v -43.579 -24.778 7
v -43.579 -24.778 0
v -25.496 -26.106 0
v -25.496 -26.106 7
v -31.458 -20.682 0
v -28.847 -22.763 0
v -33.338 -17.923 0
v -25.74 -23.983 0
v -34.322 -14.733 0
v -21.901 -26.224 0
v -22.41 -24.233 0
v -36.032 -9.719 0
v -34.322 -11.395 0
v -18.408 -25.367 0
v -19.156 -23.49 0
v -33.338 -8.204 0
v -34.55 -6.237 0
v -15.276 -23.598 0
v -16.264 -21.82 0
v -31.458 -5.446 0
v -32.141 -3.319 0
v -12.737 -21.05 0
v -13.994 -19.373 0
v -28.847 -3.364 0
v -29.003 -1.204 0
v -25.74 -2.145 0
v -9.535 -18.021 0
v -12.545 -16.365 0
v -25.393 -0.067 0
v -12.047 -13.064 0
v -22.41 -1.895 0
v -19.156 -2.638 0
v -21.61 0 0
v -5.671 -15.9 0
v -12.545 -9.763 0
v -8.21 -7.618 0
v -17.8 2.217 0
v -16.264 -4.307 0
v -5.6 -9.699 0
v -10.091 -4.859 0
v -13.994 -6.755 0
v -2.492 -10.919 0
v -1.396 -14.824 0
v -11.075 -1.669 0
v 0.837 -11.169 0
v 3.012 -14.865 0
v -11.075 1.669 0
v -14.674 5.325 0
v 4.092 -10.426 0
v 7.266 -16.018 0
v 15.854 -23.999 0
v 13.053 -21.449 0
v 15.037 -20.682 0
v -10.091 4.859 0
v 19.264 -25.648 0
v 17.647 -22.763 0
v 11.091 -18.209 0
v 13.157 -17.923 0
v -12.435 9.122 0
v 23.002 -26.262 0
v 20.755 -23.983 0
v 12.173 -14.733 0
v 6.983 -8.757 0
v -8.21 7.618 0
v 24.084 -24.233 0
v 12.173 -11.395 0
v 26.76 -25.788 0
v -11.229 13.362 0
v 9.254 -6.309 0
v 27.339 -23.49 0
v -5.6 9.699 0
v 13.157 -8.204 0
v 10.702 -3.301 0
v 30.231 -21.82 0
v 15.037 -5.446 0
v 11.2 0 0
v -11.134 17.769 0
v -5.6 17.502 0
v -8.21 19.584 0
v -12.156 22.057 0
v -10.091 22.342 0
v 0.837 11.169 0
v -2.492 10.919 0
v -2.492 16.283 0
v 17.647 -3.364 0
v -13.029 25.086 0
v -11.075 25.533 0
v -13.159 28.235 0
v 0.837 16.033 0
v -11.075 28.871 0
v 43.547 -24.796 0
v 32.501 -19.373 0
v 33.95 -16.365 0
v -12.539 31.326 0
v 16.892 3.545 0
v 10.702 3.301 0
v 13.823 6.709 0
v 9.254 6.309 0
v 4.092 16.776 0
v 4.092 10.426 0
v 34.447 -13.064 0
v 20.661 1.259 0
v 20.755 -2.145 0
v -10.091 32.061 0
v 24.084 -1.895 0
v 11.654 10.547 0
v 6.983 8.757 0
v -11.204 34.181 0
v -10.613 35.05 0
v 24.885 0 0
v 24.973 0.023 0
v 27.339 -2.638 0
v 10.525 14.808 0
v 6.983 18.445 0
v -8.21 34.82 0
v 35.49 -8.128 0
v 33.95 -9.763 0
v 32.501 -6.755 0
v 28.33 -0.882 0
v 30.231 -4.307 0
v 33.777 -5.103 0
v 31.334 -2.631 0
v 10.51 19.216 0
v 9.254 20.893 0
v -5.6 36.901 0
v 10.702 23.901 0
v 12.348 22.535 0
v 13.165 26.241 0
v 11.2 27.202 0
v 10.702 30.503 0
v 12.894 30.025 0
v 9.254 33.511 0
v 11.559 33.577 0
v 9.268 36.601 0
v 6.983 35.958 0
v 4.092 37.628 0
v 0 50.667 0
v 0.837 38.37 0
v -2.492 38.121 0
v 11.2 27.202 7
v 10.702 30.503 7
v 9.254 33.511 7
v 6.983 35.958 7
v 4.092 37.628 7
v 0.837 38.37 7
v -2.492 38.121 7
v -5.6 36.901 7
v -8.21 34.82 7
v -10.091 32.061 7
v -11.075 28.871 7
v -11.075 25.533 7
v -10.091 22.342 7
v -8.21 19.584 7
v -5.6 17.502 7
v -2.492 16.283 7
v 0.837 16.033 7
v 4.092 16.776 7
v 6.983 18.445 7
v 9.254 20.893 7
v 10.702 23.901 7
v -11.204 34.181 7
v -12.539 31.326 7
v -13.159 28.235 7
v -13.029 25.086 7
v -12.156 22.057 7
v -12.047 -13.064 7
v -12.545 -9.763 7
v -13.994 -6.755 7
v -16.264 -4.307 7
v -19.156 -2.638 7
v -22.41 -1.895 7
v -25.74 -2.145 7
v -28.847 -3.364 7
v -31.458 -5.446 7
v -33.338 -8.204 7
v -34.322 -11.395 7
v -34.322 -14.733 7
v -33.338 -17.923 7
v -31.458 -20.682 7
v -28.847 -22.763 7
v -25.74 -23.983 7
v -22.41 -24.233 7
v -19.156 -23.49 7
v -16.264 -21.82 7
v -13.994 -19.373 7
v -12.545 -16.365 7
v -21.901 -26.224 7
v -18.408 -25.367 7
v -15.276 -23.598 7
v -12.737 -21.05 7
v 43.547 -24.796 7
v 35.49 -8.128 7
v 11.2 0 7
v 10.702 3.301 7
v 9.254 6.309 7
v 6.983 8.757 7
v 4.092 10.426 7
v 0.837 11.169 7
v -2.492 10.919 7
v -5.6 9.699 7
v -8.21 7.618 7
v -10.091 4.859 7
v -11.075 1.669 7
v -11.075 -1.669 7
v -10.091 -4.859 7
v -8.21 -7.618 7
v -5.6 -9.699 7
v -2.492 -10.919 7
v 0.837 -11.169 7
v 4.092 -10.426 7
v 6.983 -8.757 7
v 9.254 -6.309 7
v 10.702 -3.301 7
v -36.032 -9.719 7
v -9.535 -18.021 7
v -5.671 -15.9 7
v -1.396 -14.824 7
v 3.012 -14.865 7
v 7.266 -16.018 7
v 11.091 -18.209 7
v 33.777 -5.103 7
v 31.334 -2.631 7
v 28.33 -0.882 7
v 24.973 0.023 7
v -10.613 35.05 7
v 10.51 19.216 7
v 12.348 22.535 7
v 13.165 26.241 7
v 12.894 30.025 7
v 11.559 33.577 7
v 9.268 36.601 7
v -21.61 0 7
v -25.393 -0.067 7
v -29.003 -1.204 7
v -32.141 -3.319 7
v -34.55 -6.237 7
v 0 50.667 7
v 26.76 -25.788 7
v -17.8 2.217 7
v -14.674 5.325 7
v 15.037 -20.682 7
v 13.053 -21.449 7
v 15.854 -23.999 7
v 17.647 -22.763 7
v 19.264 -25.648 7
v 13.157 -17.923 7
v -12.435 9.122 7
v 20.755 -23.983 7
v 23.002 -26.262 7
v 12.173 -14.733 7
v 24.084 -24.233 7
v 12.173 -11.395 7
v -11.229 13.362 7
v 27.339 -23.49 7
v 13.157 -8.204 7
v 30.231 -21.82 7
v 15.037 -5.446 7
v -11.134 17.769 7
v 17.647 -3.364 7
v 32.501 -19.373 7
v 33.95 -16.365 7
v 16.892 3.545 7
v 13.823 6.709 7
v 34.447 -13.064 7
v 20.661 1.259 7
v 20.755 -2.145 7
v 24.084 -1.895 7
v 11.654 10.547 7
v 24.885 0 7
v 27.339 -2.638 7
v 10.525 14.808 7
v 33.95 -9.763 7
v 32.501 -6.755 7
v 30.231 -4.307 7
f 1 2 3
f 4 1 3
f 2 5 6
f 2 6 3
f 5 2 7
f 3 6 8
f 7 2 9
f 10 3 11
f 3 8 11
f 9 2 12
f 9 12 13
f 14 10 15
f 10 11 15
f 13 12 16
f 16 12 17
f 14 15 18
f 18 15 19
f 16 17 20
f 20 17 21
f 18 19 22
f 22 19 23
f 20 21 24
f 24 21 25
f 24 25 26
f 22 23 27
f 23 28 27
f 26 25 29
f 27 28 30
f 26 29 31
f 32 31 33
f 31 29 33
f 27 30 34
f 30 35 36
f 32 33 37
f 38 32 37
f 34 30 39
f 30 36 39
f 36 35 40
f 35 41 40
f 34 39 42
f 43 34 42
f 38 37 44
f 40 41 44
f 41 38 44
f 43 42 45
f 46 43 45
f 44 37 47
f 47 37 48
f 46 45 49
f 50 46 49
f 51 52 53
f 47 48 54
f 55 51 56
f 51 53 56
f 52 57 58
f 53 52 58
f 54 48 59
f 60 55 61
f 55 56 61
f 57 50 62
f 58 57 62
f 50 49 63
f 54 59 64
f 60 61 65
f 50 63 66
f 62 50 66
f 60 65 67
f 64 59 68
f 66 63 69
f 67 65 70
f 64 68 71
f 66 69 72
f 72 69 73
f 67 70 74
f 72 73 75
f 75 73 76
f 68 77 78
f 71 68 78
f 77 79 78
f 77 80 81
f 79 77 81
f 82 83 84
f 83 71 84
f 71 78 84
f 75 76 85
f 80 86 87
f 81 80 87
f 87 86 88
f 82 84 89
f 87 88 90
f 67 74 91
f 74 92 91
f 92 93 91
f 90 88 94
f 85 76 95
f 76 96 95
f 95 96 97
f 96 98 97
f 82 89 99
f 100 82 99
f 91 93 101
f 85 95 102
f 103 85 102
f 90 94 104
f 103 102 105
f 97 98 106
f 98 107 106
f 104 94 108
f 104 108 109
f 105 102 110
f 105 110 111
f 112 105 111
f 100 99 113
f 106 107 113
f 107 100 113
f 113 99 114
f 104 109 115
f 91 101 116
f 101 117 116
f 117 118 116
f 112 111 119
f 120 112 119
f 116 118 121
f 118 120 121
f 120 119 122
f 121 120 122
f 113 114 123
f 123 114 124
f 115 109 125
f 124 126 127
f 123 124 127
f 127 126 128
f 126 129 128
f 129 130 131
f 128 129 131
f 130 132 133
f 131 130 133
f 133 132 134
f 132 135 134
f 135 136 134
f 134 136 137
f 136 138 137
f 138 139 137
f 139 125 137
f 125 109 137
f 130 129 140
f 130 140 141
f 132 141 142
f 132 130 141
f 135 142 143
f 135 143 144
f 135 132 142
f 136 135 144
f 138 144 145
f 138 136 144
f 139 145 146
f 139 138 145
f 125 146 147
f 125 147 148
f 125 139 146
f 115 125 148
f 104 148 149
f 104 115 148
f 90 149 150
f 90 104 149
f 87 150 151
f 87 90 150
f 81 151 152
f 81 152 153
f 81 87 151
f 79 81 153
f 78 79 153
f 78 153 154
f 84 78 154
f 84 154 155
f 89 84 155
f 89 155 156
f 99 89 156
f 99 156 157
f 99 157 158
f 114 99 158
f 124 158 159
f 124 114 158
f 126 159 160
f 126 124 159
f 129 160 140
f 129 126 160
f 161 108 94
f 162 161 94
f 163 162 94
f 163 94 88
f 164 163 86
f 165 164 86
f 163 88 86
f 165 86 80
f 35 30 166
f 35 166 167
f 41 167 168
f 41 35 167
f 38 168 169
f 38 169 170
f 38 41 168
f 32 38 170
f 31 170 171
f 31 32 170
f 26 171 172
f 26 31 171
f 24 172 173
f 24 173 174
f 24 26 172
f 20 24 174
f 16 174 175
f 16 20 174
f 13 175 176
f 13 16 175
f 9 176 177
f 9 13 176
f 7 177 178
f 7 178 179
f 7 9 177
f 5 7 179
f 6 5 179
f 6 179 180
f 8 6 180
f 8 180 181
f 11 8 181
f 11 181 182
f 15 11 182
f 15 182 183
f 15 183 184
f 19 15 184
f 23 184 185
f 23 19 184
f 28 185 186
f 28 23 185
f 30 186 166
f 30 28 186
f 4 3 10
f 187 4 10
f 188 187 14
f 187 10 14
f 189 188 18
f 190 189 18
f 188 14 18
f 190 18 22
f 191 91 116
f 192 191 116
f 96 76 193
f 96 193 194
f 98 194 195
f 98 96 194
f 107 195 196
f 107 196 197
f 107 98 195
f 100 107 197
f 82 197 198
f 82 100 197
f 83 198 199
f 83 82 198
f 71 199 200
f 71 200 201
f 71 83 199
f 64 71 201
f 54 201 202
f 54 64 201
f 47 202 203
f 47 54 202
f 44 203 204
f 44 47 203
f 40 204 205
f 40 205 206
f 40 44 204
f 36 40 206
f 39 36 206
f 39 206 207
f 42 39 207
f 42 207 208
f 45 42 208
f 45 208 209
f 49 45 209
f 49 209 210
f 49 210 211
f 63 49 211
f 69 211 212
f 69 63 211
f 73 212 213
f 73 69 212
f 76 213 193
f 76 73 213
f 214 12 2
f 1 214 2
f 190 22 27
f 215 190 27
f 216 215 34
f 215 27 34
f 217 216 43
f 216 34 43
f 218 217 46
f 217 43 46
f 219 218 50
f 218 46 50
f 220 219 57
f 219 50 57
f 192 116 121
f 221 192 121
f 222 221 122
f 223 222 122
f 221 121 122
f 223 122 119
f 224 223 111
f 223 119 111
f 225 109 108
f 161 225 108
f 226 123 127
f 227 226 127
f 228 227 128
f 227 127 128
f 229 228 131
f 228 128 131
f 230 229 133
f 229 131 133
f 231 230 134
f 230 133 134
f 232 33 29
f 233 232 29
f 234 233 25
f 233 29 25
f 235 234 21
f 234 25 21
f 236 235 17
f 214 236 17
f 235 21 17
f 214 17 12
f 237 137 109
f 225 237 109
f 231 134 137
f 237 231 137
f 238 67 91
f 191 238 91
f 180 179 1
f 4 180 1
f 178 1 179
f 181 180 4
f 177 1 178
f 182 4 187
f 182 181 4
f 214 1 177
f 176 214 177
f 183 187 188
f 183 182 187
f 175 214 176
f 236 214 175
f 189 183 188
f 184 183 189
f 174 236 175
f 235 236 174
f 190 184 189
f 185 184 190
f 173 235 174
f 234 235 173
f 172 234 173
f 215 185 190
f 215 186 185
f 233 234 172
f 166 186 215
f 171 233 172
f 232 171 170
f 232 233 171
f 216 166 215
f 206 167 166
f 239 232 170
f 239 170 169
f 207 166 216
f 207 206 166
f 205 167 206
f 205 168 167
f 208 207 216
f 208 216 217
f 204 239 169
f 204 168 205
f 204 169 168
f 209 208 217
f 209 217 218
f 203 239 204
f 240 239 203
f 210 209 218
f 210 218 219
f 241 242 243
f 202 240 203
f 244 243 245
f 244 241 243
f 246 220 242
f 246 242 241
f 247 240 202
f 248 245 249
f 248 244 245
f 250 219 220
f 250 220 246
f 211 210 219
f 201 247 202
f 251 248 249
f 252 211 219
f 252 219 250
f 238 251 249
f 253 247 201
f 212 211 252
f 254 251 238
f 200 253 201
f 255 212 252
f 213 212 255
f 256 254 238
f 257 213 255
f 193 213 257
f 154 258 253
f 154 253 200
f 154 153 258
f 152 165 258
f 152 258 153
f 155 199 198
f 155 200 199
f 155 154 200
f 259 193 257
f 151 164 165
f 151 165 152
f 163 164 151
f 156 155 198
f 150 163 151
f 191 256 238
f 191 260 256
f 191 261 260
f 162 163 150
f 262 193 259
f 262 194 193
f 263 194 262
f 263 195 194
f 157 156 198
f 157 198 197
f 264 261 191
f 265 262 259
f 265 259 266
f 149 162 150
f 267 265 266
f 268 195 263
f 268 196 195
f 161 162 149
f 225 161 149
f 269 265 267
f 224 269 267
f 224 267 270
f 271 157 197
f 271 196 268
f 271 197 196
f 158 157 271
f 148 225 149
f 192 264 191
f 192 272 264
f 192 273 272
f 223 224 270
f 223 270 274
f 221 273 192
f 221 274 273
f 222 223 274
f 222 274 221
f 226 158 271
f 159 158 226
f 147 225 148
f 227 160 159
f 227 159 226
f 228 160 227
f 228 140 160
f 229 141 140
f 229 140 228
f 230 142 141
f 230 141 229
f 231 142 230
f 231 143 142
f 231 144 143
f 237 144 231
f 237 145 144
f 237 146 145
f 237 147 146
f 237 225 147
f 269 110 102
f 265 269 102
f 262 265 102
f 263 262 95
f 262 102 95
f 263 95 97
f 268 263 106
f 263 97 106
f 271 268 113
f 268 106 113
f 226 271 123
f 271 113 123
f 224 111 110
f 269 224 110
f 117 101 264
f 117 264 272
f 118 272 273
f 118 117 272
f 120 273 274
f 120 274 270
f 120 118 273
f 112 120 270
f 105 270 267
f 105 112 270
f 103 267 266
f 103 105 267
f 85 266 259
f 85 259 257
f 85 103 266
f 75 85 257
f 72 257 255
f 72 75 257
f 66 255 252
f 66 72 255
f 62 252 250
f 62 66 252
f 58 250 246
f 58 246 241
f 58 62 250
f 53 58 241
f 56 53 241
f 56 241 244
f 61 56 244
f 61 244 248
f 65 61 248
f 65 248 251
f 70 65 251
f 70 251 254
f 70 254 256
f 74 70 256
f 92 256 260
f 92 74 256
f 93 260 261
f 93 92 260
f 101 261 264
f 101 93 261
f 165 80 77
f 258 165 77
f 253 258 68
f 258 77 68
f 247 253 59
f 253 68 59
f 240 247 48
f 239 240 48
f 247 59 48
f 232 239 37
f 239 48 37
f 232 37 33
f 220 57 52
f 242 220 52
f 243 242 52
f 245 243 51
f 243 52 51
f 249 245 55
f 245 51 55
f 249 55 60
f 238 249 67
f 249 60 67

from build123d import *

# Parameters (mm, degrees)
F0_R     = 11.2
F1_DEPTH = 7


# Not quite as in the source:
# - ends of sketch curves that miss each other by under 0.0002 mm in the source are joined


with BuildPart() as f1:
    # F0 (on Top) → F1 (new body)
    with BuildSketch(Plane.XY):
        with BuildLine():
            ThreePointArc((24.885011592, 0), (13.8227560246, 6.7091569655), (10.5100821241, 19.2156543591))
            ThreePointArc((10.5100821241, 19.2156543591), (13.1664242497, 28.1426673783), (9.267685926, 36.601246125))
            Line((9.267685926, 36.601246125), (0, 50.6668537855))
            Line((0, 50.6668537855), (-10.6134602306, 35.0499921165))
            Line((-10.6134602306, 35.0499921165), (-11.2040059959, 34.1810510431))
            ThreePointArc((-11.2040059959, 34.1810510431), (-13.1594893438, 28.235141726), (-12.1560699163, 22.0568812763))
            ThreePointArc((-12.1560699163, 22.0568812763), (-12.4352425028, 9.122108449), (-21.6098500078, 0))
            ThreePointArc((-21.6098500078, 0), (-30.6478922927, -2.1487015261), (-36.0320947169, -9.7191574841))
            Line((-36.0320947169, -9.7191574841), (-43.5794253076, -24.7780127605))
            Line((-43.5794253076, -24.7780127605), (-25.4962357758, -26.1061598733))
            ThreePointArc((-25.4962357758, -26.1061598733), (-18.4080870059, -25.3666213531), (-12.7374420281, -21.0500769317))
            ThreePointArc((-12.7374420281, -21.0500769317), (-1.3959205219, -14.82446107), (11.0913608835, -18.2088500145))
            ThreePointArc((11.0913608835, -18.2088500145), (17.4993705689, -24.9467054642), (26.7596797789, -25.7881075822))
            ThreePointArc((26.7596797789, -25.7881075822), (35.0805283727, -18.9135515404), (35.4898237471, -8.127981579))
            ThreePointArc((35.4898237471, -8.127981579), (31.3336966338, -2.63072231), (24.9734656325, 0.0227120051))
            Line((24.9734656325, 0.0227120051), (24.885011592, 0))
        make_face()
        with Locations((-23.2474307999, -13.063953107)):
            Circle(F0_R, mode=Mode.SUBTRACT)
        with Locations((23.2474307999, -13.063953107)):
            Circle(F0_R, mode=Mode.SUBTRACT)
        Circle(F0_R, mode=Mode.SUBTRACT)
        with Locations((0, 27.2017781838)):
            Circle(F0_R, mode=Mode.SUBTRACT)
        with BuildLine():
            Line((43.5474583602, -24.7964688862), (35.4898237471, -8.127981579))
            ThreePointArc((35.4898237471, -8.127981579), (35.0805283727, -18.9135515404), (26.7596797789, -25.7881075822))
            Line((26.7596797789, -25.7881075822), (43.5474583602, -24.7964688862))
        make_face()
    extrude(amount=F1_DEPTH)


solid = f1.part
